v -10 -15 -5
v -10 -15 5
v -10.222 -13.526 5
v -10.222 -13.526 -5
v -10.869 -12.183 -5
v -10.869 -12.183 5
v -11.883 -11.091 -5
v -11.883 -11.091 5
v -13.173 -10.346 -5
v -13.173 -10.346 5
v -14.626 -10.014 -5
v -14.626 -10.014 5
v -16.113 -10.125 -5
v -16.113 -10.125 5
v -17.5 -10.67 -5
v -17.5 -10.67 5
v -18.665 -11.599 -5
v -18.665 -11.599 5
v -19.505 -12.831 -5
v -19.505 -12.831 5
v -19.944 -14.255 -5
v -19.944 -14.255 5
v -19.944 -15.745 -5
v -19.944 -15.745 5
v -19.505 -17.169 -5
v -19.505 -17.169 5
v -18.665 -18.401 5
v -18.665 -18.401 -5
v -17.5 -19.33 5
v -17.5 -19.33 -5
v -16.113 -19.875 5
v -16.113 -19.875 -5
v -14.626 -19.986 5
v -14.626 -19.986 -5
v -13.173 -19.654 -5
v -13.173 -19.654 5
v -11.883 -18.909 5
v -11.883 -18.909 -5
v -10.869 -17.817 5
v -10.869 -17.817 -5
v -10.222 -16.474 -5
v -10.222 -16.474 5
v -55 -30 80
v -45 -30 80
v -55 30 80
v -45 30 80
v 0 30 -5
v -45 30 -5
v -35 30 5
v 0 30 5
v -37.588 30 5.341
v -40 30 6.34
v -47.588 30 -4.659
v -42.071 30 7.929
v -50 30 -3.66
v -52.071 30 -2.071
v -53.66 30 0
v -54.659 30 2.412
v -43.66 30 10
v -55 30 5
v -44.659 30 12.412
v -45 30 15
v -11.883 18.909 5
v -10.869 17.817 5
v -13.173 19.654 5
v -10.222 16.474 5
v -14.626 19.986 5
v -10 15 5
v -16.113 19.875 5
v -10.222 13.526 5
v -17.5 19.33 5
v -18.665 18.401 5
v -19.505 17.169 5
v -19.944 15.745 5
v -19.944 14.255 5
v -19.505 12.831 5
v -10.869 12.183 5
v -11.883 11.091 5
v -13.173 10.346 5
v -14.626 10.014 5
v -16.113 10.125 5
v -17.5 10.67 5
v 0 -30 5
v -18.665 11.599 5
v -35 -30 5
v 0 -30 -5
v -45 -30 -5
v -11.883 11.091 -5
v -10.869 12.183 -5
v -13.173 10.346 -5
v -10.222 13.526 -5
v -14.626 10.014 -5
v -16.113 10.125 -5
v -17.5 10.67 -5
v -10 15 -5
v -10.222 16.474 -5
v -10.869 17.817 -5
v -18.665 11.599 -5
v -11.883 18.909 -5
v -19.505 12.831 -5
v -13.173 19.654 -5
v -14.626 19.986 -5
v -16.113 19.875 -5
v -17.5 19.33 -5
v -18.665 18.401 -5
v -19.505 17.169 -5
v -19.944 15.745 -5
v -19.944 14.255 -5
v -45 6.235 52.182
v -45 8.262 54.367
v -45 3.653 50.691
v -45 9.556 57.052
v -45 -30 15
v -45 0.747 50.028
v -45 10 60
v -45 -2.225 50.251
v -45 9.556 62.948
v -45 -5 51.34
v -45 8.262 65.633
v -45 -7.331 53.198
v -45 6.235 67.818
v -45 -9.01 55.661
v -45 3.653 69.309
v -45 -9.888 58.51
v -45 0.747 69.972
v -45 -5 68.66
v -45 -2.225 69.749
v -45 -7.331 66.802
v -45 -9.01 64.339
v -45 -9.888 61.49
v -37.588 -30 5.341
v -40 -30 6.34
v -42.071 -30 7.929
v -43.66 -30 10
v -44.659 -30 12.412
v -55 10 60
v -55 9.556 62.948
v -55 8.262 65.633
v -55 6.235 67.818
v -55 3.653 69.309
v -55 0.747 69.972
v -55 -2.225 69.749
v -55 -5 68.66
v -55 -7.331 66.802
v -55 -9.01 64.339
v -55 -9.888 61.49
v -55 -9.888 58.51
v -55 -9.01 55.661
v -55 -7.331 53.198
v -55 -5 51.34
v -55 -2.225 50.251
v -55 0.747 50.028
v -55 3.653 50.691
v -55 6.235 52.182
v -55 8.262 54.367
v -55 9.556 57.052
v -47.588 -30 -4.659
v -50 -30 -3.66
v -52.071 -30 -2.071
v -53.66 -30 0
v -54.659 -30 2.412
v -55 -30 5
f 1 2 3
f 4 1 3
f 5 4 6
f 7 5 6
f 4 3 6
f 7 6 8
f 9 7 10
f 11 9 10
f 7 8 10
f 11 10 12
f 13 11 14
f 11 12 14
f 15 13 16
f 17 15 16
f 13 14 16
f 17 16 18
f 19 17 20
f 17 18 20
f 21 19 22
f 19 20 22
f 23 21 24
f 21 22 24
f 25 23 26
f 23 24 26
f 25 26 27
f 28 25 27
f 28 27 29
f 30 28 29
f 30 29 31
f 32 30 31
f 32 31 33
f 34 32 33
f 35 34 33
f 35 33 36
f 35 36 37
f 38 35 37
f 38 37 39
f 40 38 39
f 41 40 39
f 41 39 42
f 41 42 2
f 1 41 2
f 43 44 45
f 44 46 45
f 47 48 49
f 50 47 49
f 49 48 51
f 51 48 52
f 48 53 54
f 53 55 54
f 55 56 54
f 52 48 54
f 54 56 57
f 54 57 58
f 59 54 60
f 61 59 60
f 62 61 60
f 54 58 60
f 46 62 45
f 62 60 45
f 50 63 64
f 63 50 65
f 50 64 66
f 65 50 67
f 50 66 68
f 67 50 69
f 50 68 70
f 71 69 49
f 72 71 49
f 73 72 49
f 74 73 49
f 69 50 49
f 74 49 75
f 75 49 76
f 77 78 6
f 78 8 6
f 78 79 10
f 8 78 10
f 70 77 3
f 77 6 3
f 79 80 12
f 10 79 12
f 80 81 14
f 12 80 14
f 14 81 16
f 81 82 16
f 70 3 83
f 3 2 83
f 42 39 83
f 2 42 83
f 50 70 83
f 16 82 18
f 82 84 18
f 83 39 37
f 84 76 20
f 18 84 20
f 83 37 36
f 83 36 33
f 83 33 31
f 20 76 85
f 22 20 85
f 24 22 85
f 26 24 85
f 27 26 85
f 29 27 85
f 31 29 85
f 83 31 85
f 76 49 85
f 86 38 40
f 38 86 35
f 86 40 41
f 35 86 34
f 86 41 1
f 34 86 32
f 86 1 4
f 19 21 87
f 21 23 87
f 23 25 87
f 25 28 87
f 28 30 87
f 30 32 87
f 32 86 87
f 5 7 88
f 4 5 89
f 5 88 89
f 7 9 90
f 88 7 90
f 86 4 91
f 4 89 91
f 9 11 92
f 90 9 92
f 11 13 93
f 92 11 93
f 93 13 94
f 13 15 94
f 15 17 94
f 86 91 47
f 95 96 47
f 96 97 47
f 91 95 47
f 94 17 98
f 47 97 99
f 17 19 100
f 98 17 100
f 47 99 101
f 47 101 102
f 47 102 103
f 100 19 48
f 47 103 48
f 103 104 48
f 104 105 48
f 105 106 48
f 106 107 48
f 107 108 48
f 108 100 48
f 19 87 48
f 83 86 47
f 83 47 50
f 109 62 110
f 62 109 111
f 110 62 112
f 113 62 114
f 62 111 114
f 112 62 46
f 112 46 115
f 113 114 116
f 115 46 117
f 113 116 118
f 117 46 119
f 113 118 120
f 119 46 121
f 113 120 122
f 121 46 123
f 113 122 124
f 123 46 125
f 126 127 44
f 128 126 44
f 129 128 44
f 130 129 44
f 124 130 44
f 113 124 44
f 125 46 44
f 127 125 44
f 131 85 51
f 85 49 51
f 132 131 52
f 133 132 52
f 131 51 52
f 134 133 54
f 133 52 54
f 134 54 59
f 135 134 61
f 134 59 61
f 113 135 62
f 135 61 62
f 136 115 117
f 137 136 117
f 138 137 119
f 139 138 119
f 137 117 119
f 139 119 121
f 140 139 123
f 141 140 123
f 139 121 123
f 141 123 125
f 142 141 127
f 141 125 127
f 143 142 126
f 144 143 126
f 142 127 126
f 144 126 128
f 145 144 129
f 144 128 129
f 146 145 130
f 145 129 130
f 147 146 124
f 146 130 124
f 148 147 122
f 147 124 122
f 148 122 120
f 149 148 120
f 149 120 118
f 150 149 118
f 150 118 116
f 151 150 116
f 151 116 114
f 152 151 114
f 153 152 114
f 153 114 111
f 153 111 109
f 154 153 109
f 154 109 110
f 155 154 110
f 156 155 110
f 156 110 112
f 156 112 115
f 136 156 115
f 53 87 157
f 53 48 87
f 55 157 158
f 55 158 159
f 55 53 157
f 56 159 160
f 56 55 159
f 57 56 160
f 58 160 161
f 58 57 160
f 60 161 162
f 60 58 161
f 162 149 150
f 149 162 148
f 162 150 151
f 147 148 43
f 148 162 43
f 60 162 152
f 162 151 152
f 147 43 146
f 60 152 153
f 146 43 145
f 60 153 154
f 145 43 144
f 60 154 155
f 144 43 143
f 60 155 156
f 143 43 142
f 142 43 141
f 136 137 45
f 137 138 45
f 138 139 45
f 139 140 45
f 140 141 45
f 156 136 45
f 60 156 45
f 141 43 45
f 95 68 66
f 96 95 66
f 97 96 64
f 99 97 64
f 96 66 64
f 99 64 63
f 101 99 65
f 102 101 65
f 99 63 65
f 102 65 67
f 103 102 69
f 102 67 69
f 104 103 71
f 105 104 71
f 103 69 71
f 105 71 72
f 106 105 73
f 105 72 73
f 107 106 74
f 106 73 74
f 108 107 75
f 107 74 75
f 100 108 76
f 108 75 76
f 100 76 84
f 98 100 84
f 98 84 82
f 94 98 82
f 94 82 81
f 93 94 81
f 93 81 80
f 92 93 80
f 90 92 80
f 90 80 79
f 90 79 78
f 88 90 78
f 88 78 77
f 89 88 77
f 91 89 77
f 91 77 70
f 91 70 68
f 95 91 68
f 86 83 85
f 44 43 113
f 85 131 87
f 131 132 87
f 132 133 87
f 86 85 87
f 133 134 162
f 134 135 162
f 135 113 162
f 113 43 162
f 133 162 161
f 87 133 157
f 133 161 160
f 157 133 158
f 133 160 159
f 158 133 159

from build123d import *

# Parameters (mm, degrees)
F0_W     = 60
F0_H     = 10
F3_R     = 10
F4_R     = 10
F5_DEPTH = 10.001
F6_R     = 5
F7_DEPTH = 25
F8_R     = 5
F9_DEPTH = 25


with BuildPart() as f2:
    # F2: sweep along a path in F1
    with BuildLine(Plane.XZ) as f2_path:
        Line((0, 0), (-50, 0))
        Line((-50, 0), (-50, 80))
    # F0 (on Right) → F2 (sweep)
    with BuildSketch(Plane.YZ):
        Rectangle(F0_W, F0_H)
    sweep(path=f2_path.line, transition=Transition.RIGHT)

    # F3
    f3_edges = [f2.edges().sort_by_distance(p)[0] for p in [
        (-45, 0, 5),
        (-55, 0, -5),
    ]]
    fillet(f3_edges, radius=F3_R)

    # F4 (on face) → F5 (cut, through all)
    with BuildSketch(Plane.YZ.offset(-45)):
        with Locations((0, 60)):
            Circle(F4_R)
    extrude(amount=-F5_DEPTH, mode=Mode.SUBTRACT)

    # F6 (on face) → F7 (cut)
    with BuildSketch(Plane.XY.offset(5)):
        with Locations((-15, 15)):
            Circle(F6_R)
    extrude(amount=-F7_DEPTH, mode=Mode.SUBTRACT)

    # F8 (on face) → F9 (cut)
    with BuildSketch(Plane.XY.offset(5)):
        with Locations((-15, -15)):
            Circle(F8_R)
    extrude(amount=-F9_DEPTH, mode=Mode.SUBTRACT)


solid = f2.part
